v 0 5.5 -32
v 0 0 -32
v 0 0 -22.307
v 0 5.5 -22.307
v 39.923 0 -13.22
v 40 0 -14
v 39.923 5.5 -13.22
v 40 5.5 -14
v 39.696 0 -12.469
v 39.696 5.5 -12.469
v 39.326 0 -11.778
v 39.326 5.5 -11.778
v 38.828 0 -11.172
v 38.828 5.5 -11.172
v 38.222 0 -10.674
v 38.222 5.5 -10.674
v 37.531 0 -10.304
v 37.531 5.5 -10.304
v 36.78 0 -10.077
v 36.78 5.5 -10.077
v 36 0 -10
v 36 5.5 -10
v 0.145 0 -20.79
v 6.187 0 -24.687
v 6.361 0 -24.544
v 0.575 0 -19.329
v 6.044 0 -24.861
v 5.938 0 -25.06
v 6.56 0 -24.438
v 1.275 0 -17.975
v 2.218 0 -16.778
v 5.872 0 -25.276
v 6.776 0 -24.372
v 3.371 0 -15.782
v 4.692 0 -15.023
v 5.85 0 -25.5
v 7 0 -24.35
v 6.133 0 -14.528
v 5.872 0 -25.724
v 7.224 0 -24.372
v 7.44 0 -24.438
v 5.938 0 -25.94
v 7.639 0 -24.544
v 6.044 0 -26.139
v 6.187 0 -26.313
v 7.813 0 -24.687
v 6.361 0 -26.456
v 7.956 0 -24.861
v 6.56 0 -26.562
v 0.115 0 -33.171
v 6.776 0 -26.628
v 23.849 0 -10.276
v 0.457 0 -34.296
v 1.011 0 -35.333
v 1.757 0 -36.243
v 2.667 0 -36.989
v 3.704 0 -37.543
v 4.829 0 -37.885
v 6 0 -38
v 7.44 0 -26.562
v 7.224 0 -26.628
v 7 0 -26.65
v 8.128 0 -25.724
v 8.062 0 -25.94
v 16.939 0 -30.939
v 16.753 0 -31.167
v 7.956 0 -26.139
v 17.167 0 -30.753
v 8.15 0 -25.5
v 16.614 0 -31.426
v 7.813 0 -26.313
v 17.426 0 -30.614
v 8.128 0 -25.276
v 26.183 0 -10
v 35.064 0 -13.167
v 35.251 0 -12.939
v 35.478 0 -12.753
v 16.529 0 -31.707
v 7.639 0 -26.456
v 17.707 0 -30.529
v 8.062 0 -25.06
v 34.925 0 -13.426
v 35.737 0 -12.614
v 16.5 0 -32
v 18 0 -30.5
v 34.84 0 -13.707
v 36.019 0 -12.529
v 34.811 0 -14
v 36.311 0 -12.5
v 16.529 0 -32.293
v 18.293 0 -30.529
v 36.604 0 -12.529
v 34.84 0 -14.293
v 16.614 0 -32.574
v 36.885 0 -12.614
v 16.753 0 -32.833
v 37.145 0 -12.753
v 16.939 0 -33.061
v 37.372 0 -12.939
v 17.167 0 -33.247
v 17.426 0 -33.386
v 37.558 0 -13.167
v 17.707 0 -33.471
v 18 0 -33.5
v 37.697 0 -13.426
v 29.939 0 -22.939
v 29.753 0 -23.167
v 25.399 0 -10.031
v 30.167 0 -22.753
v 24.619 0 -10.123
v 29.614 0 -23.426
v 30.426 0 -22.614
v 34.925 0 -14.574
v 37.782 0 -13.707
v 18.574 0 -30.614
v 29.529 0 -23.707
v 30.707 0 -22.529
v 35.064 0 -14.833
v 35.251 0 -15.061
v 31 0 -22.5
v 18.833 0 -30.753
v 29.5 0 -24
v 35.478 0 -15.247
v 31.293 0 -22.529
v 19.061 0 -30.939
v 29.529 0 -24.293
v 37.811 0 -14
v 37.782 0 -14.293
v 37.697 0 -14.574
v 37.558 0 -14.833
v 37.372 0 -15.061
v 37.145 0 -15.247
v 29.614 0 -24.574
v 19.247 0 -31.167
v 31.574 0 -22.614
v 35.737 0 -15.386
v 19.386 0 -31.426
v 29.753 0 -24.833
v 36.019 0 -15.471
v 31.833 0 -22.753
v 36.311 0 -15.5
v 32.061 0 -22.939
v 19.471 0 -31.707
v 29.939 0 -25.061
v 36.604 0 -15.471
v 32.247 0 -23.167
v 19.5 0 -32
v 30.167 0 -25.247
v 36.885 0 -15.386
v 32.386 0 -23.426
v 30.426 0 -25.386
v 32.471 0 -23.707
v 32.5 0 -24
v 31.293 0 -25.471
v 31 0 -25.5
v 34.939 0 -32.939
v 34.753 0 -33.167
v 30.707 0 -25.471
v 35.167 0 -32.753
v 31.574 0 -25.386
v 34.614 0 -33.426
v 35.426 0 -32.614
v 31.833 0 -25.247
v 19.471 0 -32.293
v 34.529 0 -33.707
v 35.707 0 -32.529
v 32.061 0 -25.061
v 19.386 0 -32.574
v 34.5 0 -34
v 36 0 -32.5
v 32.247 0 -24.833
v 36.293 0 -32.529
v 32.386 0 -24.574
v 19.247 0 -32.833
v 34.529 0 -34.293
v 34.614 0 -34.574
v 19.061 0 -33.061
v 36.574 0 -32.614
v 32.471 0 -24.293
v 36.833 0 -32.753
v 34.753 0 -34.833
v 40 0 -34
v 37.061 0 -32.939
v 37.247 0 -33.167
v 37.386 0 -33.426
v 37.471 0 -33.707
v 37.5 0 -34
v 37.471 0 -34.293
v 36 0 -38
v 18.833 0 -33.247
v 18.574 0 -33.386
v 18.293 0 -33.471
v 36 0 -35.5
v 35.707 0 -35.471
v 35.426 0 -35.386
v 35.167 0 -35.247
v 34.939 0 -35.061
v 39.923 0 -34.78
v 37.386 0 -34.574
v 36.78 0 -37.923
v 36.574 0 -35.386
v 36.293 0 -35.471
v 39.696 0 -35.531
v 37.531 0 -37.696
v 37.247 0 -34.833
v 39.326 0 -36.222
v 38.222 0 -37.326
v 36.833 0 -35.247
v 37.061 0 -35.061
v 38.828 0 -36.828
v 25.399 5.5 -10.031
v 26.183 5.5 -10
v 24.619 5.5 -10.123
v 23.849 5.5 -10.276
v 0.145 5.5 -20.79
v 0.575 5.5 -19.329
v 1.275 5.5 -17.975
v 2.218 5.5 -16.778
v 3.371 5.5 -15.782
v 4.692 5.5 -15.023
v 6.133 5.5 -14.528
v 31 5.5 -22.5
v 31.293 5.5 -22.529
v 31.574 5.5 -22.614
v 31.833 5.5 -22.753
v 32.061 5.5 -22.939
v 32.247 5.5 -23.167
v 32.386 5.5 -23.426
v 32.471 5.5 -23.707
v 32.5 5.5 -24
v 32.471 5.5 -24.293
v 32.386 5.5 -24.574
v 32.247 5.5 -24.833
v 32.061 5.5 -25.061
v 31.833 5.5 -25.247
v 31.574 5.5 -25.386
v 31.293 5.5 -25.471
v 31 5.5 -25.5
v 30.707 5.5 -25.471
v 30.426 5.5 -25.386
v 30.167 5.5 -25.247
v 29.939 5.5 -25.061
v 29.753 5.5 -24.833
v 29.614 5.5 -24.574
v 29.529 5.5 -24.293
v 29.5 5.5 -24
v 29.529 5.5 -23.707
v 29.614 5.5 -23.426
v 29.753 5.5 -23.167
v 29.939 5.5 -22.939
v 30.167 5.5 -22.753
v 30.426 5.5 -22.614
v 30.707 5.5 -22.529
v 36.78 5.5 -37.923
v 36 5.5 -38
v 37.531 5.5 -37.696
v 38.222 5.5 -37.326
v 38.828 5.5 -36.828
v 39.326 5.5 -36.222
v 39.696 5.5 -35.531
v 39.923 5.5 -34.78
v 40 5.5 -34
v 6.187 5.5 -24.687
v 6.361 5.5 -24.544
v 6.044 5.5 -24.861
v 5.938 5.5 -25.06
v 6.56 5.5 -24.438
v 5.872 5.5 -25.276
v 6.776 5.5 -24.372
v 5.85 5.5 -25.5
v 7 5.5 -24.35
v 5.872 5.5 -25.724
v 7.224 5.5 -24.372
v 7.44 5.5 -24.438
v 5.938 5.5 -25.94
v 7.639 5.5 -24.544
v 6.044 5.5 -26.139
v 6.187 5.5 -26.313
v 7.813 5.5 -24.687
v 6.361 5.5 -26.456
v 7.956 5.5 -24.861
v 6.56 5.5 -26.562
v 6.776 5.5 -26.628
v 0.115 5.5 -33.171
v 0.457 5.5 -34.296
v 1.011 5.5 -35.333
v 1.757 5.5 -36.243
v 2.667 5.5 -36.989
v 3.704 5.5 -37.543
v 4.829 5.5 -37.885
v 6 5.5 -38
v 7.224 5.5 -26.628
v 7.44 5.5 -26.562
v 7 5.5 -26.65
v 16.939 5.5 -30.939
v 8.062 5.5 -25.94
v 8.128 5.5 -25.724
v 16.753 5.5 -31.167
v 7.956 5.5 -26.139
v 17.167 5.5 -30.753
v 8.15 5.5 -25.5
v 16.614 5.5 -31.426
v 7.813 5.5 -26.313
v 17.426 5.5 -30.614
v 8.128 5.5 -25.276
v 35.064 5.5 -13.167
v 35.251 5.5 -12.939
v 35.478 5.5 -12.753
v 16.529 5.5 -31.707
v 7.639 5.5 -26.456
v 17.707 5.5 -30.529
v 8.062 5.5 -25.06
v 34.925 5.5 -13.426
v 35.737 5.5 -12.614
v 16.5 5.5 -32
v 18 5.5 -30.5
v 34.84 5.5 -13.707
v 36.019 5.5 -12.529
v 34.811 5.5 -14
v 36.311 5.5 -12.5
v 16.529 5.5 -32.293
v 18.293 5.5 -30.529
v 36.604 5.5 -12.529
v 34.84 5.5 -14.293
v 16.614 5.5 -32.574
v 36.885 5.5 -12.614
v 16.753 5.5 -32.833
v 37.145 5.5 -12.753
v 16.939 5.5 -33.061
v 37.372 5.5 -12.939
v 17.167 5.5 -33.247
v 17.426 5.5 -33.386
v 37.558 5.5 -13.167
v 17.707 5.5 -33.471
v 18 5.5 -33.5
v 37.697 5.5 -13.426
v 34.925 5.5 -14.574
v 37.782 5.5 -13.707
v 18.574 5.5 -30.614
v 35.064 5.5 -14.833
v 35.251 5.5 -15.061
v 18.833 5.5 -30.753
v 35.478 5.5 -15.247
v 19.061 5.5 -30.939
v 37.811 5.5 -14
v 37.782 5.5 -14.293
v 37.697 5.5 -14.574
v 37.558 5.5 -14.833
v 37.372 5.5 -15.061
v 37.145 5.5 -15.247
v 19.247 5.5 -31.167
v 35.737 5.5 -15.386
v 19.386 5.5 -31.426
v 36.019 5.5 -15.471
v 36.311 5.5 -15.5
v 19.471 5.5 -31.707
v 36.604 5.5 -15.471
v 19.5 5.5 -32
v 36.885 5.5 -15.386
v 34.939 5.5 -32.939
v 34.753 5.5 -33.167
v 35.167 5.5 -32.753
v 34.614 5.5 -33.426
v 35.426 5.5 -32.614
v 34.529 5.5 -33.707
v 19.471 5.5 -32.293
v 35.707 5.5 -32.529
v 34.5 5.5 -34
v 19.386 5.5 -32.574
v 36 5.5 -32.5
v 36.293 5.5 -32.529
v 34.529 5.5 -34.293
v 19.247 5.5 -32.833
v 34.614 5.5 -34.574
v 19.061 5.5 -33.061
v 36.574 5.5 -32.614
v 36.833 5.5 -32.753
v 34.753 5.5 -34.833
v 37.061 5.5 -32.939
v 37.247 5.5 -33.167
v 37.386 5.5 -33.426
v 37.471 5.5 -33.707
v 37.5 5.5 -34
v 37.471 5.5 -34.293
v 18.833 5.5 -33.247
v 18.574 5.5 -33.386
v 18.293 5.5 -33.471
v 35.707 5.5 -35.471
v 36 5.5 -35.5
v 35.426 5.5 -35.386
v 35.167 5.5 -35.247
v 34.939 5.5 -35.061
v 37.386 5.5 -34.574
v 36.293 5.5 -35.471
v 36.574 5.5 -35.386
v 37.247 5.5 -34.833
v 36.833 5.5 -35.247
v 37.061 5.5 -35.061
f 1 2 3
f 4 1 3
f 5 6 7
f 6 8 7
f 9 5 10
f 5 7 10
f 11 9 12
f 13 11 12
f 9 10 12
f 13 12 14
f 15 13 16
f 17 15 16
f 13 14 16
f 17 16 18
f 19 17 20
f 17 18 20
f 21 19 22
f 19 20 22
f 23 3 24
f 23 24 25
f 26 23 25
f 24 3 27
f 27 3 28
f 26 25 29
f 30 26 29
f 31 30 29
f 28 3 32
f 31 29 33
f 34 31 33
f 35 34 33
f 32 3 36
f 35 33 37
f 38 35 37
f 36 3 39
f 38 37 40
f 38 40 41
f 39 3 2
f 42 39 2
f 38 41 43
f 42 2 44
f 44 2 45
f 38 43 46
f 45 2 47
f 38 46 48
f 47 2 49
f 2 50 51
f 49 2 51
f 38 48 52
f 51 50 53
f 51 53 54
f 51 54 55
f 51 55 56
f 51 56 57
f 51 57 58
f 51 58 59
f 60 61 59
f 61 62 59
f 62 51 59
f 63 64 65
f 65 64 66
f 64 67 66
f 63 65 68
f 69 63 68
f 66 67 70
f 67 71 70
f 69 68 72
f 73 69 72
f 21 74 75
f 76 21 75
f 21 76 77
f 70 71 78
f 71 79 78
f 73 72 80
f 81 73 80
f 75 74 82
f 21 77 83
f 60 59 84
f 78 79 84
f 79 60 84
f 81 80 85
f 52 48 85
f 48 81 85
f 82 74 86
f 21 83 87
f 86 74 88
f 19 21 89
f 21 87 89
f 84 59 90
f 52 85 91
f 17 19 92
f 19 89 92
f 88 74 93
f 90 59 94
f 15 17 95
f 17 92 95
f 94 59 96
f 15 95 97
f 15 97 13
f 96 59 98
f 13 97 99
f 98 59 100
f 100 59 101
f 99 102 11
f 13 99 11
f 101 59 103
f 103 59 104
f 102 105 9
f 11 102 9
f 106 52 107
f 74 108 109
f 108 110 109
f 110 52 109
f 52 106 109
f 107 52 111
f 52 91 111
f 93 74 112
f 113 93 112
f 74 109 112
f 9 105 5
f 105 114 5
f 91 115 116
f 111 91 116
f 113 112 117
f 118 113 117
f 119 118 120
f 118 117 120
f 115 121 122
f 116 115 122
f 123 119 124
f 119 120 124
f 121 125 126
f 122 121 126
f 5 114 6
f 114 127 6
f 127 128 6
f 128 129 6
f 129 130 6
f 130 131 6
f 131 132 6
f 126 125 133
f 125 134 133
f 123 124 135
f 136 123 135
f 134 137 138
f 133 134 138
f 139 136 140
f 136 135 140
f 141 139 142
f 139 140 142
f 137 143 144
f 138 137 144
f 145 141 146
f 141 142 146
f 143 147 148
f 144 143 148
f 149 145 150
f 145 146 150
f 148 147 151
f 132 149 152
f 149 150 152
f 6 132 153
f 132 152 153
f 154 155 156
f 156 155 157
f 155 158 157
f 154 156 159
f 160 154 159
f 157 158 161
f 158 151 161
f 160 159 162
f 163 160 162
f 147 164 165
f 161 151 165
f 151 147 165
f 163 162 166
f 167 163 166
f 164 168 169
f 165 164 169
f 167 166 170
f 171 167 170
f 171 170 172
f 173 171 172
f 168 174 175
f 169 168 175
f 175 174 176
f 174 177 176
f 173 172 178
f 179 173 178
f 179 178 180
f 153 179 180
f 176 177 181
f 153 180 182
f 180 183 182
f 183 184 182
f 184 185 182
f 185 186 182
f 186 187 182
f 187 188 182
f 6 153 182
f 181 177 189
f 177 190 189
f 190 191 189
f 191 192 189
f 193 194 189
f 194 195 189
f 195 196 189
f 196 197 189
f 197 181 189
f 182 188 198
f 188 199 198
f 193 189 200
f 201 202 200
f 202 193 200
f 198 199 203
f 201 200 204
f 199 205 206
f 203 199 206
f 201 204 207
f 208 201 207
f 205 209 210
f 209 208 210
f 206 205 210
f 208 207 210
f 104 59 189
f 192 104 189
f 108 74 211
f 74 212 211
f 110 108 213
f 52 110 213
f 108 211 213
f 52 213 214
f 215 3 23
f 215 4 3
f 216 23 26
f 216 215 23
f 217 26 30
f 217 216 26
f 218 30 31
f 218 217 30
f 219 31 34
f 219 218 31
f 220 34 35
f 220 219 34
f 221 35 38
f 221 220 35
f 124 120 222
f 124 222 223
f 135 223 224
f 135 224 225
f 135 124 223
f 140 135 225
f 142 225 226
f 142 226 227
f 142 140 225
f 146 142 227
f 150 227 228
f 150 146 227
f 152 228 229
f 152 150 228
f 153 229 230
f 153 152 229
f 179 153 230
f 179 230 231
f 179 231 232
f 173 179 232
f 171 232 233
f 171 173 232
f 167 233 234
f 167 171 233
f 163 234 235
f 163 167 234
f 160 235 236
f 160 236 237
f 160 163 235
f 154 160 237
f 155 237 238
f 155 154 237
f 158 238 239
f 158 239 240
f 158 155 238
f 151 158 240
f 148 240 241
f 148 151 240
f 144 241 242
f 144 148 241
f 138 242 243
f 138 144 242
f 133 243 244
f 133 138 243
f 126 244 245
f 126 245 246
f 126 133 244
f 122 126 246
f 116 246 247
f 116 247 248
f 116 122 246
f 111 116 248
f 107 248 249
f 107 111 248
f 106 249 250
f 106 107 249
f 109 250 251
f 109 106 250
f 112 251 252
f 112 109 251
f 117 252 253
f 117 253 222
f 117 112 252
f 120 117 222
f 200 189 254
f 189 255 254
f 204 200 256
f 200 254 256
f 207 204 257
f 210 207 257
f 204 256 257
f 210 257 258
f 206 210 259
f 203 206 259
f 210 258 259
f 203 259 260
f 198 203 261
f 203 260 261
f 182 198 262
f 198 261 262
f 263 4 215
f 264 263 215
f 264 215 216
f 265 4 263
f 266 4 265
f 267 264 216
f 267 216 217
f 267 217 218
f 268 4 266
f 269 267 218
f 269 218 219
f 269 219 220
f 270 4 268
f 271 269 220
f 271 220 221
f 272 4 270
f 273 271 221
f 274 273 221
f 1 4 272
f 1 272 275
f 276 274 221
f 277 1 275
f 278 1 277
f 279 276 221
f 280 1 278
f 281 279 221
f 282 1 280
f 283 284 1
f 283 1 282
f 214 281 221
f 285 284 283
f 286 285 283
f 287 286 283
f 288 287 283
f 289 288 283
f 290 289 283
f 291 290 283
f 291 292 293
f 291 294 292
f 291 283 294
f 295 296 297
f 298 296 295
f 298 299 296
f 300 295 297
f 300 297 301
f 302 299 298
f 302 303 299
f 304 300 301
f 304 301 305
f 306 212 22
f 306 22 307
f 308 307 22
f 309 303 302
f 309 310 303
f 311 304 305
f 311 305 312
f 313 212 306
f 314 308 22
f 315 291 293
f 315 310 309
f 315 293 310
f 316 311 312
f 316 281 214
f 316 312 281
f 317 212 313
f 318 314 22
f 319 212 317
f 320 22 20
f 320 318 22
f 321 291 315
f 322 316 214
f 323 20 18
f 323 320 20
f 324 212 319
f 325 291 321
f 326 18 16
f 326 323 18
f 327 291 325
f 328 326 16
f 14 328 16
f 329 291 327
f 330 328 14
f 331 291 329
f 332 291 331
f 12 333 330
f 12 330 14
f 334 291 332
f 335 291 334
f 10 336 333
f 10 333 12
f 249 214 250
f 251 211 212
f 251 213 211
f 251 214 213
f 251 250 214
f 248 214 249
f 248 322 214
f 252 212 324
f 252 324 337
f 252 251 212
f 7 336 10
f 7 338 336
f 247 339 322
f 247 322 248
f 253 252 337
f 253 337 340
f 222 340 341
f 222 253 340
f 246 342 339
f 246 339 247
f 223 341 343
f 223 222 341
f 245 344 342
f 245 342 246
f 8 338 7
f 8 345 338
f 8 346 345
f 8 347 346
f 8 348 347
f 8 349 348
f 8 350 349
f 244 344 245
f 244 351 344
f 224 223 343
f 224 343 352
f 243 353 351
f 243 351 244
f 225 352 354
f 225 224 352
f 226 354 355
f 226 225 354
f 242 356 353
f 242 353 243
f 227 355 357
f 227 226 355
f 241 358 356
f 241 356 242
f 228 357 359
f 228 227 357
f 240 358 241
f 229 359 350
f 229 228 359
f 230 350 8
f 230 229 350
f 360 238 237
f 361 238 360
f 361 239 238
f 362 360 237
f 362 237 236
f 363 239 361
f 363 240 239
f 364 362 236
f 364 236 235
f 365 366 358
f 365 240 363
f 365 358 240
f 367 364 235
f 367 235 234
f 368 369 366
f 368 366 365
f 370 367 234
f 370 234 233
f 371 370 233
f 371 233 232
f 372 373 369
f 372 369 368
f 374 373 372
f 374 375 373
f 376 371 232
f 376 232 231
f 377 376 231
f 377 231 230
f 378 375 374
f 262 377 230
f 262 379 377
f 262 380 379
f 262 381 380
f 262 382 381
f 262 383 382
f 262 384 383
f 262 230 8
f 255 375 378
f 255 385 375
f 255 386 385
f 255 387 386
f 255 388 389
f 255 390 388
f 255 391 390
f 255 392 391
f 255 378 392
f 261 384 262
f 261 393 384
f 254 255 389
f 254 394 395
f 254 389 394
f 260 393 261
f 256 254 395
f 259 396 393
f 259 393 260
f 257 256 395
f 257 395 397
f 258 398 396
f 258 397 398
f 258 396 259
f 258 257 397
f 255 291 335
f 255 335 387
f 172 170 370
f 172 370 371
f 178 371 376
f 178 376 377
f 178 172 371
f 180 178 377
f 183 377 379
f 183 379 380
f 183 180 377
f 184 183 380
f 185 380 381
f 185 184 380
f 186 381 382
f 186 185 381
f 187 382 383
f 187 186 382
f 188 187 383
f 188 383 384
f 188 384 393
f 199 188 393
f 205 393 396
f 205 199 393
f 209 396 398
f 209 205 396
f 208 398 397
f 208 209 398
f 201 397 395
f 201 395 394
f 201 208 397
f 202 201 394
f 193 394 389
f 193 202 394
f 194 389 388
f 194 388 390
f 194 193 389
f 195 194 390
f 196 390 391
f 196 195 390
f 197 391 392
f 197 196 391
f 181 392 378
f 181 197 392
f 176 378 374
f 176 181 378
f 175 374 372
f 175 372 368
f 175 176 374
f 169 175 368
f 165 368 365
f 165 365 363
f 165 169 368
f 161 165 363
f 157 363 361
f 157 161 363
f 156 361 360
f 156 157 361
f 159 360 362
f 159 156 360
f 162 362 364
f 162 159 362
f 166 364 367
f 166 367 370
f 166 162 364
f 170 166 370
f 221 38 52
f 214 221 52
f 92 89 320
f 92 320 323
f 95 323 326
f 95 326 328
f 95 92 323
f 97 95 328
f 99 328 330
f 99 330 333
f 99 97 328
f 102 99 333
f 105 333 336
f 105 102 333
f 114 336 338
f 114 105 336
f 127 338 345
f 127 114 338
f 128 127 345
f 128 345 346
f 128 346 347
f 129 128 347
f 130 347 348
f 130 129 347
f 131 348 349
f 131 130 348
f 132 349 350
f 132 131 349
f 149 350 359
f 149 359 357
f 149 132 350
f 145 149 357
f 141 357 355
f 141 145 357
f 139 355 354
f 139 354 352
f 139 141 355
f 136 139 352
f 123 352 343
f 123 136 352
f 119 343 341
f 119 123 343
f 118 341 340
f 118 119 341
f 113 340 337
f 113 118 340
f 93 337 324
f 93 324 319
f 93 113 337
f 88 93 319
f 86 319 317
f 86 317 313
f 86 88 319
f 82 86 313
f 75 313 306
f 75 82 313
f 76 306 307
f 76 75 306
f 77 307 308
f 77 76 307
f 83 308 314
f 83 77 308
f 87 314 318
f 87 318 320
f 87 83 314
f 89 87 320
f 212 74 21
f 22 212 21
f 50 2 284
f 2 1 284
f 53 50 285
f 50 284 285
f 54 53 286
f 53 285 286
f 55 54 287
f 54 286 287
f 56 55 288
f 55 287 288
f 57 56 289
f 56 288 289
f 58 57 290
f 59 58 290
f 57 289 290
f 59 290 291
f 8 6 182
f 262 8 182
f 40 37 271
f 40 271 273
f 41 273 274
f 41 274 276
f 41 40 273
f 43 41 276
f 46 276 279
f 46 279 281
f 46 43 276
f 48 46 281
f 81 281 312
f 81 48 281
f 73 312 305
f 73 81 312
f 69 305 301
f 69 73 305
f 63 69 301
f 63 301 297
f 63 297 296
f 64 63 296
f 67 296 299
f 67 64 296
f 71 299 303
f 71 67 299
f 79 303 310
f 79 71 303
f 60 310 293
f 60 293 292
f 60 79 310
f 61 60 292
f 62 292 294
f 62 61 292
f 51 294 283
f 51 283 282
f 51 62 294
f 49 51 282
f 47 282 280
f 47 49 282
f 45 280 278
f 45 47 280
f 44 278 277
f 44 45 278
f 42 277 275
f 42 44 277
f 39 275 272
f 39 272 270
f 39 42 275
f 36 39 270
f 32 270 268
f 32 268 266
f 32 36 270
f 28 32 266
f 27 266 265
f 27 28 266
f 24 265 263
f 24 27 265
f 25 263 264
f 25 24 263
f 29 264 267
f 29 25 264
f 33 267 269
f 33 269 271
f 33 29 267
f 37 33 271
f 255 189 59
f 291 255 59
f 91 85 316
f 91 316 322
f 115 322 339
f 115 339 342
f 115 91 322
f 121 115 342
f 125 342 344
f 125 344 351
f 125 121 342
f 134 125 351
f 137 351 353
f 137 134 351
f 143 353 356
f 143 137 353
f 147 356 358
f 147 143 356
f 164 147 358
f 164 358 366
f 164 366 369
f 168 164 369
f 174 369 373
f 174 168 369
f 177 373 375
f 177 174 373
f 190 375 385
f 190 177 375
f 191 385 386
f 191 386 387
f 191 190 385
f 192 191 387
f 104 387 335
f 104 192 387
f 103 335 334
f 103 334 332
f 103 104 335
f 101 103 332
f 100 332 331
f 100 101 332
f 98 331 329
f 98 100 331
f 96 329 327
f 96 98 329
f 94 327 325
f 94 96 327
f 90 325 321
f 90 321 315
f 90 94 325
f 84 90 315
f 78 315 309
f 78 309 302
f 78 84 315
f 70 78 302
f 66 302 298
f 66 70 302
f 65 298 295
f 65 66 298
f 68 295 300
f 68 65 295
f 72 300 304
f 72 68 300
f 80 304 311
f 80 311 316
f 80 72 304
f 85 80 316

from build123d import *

# Parameters (mm, degrees)
SKETCH1_R           = 1.5
SKETCH1_R_2         = 1.15
BOSS_EXTRUDE1_DEPTH = 5.5
FILLET1_R           = 6
FILLET2_R           = 8
FILLET3_R           = 4
FILLET4_R           = 4
FILLET5_R           = 10


with BuildPart() as part:
    # Sketch1 → Boss-Extrude1 (new body)
    with BuildSketch(Plane(origin=(0, 0, 0), x_dir=(1, 0, 0), z_dir=(0, 1, 0))):
        Polygon((0, 16), (25, 10), (40, 10), (40, 38), (0, 38), align=None)
        with Locations(Location((36, 34, 0), (0, 0, 270))):
            Circle(SKETCH1_R, mode=Mode.SUBTRACT)
        with Locations(Location((36.311245585, 14, 0), (0, 0, 270))):
            Circle(SKETCH1_R, mode=Mode.SUBTRACT)
        with Locations(Location((31, 24, 0), (0, 0, 270))):
            Circle(SKETCH1_R, mode=Mode.SUBTRACT)
        with Locations(Location((18, 32, 0), (0, 0, 270))):
            Circle(SKETCH1_R, mode=Mode.SUBTRACT)
        with Locations(Location((7, 25.5, 0), (0, 0, 270))):
            Circle(SKETCH1_R_2, mode=Mode.SUBTRACT)
    extrude(amount=BOSS_EXTRUDE1_DEPTH)

    # Fillet1
    fillet1_edges = [part.edges().sort_by_distance(p)[0] for p in [
        (0, 2.75, -38),
    ]]
    fillet(fillet1_edges, radius=FILLET1_R)

    # Fillet2
    fillet2_edges = [part.edges().sort_by_distance(p)[0] for p in [
        (0, 2.75, -16),
    ]]
    fillet(fillet2_edges, radius=FILLET2_R)

    # Fillet3
    fillet3_edges = [part.edges().sort_by_distance(p)[0] for p in [
        (40, 2.75, -38),
    ]]
    fillet(fillet3_edges, radius=FILLET3_R)

    # Fillet4
    fillet4_edges = [part.edges().sort_by_distance(p)[0] for p in [
        (40, 2.75, -10),
    ]]
    fillet(fillet4_edges, radius=FILLET4_R)

    # Fillet5
    fillet5_edges = [part.edges().sort_by_distance(p)[0] for p in [
        (25, 2.75, -10),
    ]]
    fillet(fillet5_edges, radius=FILLET5_R)


solid = part.part
